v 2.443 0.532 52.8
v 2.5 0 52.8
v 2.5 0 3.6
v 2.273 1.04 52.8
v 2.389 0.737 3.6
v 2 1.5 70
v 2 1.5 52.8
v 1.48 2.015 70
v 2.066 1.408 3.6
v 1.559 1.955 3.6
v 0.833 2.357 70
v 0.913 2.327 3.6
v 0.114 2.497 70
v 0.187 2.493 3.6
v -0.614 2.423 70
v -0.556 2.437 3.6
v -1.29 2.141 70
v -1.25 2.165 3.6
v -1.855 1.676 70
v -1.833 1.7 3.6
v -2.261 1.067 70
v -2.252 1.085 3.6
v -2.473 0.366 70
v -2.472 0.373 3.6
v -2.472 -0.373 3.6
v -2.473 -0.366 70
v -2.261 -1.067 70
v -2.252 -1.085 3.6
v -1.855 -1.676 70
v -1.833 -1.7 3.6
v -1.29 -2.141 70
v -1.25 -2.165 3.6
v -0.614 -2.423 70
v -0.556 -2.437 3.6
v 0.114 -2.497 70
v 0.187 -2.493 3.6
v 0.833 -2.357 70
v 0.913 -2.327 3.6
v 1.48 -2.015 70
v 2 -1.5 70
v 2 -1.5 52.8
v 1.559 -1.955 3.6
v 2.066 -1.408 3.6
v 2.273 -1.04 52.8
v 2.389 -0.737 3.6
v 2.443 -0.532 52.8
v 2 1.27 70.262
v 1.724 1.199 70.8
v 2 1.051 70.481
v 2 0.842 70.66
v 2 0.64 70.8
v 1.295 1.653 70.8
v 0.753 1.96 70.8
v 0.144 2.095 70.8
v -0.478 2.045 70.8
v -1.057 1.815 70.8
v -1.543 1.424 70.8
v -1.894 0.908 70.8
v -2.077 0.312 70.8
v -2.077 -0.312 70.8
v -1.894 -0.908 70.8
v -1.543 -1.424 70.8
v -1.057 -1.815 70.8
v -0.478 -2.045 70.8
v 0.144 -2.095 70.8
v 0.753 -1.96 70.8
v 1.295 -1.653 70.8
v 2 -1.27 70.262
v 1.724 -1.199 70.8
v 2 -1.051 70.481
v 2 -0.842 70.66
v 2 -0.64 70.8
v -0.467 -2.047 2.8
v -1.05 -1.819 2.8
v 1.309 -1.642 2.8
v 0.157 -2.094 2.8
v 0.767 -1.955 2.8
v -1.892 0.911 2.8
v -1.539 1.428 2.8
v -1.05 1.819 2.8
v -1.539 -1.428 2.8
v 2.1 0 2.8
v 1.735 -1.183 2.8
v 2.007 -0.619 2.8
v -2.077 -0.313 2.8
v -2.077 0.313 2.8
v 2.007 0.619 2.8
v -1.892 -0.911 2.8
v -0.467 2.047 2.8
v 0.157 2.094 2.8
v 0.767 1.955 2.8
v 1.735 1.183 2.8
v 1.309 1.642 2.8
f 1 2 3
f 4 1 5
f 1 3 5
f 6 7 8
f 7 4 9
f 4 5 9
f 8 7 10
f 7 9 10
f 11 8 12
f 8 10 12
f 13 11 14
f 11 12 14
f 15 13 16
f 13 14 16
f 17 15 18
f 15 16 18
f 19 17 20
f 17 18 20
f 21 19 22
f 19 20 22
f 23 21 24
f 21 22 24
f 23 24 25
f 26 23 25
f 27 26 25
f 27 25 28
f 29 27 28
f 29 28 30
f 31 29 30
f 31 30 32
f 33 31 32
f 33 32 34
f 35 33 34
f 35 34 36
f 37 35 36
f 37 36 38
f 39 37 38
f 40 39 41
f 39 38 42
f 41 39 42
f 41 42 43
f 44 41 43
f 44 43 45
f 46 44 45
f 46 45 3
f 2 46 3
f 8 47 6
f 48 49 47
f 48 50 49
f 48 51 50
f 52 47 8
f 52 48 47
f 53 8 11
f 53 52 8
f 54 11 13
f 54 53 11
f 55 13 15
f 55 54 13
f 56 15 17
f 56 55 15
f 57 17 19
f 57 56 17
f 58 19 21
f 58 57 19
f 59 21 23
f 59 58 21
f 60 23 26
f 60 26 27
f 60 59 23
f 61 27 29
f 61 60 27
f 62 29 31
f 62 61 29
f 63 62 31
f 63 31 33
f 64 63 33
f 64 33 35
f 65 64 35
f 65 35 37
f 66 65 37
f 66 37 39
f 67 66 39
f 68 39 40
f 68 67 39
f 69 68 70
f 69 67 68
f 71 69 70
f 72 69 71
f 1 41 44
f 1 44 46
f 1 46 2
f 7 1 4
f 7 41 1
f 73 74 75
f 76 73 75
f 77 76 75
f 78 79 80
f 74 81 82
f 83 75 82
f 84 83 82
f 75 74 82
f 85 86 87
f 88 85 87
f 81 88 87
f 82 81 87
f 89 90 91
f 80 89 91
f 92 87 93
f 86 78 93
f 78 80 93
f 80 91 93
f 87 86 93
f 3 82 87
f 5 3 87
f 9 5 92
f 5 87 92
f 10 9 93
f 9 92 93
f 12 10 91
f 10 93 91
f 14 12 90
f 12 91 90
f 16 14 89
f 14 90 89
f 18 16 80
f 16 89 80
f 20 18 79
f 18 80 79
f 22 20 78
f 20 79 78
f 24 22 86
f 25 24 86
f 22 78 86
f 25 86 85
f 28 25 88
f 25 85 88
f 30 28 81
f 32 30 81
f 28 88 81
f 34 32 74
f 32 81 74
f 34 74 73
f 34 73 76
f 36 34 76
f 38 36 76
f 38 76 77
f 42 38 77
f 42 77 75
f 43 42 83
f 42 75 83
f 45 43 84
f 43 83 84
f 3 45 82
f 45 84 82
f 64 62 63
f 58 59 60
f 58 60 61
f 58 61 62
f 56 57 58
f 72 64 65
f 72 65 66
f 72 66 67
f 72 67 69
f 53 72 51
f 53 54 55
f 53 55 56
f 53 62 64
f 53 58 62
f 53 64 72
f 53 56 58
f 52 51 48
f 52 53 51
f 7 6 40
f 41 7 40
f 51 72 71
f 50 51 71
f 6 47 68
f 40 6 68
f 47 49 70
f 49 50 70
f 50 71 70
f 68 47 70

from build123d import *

# Parameters (mm, degrees)
SKETCH012_R      = 2.5
PAD006_DEPTH     = 68
POCKET003_DEPTH  = 18
CHAMFER002_SIZE2 = 0.4
CHAMFER002_SIZE  = 0.8


with BuildPart() as part:
    # Sketch012 → Pad006 (new body)
    with BuildSketch(Plane.XY):
        Circle(SKETCH012_R)
    extrude(amount=PAD006_DEPTH)

    # Sketch013 (on Face3 of Pad006) → Pocket003 (cut)
    with BuildSketch(Plane.XY.offset(68)):
        with BuildLine():
            ThreePointArc((2, -1.5), (2.5, 0), (2, 1.5))
            Line((2, 1.5), (2, -1.5))
        make_face()
    extrude(amount=-POCKET003_DEPTH, mode=Mode.SUBTRACT)

    # Chamfer002
    chamfer002_edges = [part.edges().sort_by_distance(p)[0] for p in [
        (-2.5, 0, 68),
        (-2.5, 0, 0),
    ]]
    chamfer002_side = part.faces().sort_by_distance((-2.5, 0, 34))[0]
    chamfer(chamfer002_edges, length=CHAMFER002_SIZE, length2=CHAMFER002_SIZE2, reference=chamfer002_side)


with BuildPart() as part_1:
    # Body003 placement: moved
    add(part.part.moved(Location((0, 0, 2.8))))


solid = part_1.part
